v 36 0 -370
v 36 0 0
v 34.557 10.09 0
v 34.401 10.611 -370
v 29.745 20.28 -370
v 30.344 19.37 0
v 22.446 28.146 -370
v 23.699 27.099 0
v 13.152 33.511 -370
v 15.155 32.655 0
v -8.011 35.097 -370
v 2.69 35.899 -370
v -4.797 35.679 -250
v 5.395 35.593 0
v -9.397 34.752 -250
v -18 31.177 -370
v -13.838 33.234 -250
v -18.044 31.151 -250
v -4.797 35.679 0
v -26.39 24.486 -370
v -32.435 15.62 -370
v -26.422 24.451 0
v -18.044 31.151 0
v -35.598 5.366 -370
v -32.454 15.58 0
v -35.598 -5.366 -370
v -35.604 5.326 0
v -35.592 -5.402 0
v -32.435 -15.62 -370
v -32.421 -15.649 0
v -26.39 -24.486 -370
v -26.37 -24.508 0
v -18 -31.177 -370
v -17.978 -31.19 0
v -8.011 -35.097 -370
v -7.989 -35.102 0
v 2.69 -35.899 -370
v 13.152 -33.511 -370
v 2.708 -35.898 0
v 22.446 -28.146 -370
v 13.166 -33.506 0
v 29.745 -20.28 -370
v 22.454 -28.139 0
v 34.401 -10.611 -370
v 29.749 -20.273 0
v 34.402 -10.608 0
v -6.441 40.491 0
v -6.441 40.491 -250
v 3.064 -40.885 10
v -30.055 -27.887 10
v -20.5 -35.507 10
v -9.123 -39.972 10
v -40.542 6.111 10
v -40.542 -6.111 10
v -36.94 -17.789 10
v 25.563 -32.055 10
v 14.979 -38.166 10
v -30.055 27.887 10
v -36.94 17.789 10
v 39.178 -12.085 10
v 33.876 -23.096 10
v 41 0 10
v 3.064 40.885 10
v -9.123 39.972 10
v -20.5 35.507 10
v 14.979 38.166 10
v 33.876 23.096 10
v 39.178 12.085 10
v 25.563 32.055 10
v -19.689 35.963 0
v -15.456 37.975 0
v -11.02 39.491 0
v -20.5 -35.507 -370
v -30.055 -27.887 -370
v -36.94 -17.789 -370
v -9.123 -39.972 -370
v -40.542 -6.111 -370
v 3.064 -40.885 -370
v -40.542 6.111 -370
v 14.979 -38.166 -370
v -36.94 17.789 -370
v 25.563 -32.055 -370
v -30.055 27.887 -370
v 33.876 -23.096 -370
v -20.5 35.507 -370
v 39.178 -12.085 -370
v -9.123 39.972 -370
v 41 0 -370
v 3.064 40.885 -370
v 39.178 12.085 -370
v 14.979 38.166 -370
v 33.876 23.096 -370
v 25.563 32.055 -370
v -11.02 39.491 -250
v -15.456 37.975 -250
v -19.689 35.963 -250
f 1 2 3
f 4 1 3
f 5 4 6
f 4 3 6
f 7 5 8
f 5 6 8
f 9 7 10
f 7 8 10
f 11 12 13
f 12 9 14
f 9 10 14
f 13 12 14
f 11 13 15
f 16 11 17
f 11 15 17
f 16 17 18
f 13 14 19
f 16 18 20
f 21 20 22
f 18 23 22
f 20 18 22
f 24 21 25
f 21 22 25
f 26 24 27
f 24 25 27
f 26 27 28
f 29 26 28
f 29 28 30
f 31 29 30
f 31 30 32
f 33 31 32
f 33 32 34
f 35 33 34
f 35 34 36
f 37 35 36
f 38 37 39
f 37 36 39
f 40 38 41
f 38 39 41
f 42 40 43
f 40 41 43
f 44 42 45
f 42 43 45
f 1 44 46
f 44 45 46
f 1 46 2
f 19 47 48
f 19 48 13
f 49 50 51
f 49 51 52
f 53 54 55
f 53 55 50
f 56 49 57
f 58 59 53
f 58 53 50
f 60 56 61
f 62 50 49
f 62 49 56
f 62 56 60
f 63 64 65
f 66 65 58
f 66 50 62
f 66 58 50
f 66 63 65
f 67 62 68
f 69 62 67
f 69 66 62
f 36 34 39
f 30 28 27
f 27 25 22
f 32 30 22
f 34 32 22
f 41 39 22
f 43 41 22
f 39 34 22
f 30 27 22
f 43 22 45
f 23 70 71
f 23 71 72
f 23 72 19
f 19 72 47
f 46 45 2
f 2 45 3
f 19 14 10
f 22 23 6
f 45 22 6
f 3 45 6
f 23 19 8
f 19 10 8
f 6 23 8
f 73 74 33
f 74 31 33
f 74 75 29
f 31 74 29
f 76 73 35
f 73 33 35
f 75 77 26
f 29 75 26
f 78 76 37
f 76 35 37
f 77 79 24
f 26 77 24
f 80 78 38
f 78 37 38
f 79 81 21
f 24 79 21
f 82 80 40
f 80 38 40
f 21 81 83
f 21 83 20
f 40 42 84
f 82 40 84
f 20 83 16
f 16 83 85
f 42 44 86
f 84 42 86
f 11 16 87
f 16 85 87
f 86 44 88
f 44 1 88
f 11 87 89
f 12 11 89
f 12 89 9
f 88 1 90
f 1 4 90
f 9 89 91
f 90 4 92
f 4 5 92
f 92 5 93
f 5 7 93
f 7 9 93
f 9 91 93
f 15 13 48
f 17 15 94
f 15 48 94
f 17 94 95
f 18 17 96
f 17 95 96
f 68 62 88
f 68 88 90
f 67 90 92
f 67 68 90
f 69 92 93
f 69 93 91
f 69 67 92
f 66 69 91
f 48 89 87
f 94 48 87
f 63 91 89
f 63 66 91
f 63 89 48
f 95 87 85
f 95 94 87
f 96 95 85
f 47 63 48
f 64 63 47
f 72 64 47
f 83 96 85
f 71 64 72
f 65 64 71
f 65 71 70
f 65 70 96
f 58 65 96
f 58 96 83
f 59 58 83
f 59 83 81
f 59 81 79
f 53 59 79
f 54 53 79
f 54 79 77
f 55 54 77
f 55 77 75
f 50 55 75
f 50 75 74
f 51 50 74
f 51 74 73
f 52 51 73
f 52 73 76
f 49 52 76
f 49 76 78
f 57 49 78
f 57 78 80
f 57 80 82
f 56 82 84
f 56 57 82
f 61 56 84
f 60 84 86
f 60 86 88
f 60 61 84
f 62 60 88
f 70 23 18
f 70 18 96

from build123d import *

# Parameters (mm, degrees)
ESQUISSE1_R             = 41
ESQUISSE1_R_2           = 36
BOSS_EXTRU_1_DEPTH      = 370
BOSS_EXTRU_2_DEPTH      = 110
ENL_V_MAT_EXTRU_1_DEPTH = 250
BOSS_EXTRU_3_START      = 10
ESQUISSE3_R             = 41
BOSS_EXTRU_3_DEPTH      = 10


with BuildPart() as part:
    # Esquisse1 → Boss.-Extru.1 (new body)
    with BuildSketch(Plane.XY):
        Circle(ESQUISSE1_R)
        Circle(ESQUISSE1_R_2, mode=Mode.SUBTRACT)
    extrude(amount=-BOSS_EXTRU_1_DEPTH)


with BuildPart() as body_2:
    # Esquisse2 → Boss.-Extru.2 (new body)
    with BuildSketch(Plane.XY):
        Polygon((-20.206852958, 37.47910209), (-6.959206174, 42.006778613), (-0.491096856, 23.081568921), (-13.73874364, 18.553892399), align=None)
    extrude(amount=-BOSS_EXTRU_2_DEPTH)


with BuildPart() as enl_v_mat_extru_1_tool:
    # Esquisse2<2> → Enlèv. mat.-Extru.1 (new body)
    with BuildSketch(Plane.XY):
        Polygon((-20.206852958, 37.47910209), (-6.959206174, 42.006778613), (-0.491096856, 23.081568921), (-13.73874364, 18.553892399), align=None)
    extrude(amount=-ENL_V_MAT_EXTRU_1_DEPTH)


with BuildPart() as part_1:
    add(part.part)

    # Enlèv. mat.-Extru.1: cut by enl_v_mat_extru_1_tool
    add(enl_v_mat_extru_1_tool.part, mode=Mode.SUBTRACT)

    # Esquisse3 → Boss.-Extru.3 (add)
    with BuildSketch(Plane.XY.offset(BOSS_EXTRU_3_START)):
        Circle(ESQUISSE3_R)
    extrude(amount=-BOSS_EXTRU_3_DEPTH)


with BuildPart() as body_2_1:
    add(body_2.part)

    # Enlèv. mat.-Extru.1: cut by enl_v_mat_extru_1_tool
    add(enl_v_mat_extru_1_tool.part, mode=Mode.SUBTRACT)


solid = part_1.part
